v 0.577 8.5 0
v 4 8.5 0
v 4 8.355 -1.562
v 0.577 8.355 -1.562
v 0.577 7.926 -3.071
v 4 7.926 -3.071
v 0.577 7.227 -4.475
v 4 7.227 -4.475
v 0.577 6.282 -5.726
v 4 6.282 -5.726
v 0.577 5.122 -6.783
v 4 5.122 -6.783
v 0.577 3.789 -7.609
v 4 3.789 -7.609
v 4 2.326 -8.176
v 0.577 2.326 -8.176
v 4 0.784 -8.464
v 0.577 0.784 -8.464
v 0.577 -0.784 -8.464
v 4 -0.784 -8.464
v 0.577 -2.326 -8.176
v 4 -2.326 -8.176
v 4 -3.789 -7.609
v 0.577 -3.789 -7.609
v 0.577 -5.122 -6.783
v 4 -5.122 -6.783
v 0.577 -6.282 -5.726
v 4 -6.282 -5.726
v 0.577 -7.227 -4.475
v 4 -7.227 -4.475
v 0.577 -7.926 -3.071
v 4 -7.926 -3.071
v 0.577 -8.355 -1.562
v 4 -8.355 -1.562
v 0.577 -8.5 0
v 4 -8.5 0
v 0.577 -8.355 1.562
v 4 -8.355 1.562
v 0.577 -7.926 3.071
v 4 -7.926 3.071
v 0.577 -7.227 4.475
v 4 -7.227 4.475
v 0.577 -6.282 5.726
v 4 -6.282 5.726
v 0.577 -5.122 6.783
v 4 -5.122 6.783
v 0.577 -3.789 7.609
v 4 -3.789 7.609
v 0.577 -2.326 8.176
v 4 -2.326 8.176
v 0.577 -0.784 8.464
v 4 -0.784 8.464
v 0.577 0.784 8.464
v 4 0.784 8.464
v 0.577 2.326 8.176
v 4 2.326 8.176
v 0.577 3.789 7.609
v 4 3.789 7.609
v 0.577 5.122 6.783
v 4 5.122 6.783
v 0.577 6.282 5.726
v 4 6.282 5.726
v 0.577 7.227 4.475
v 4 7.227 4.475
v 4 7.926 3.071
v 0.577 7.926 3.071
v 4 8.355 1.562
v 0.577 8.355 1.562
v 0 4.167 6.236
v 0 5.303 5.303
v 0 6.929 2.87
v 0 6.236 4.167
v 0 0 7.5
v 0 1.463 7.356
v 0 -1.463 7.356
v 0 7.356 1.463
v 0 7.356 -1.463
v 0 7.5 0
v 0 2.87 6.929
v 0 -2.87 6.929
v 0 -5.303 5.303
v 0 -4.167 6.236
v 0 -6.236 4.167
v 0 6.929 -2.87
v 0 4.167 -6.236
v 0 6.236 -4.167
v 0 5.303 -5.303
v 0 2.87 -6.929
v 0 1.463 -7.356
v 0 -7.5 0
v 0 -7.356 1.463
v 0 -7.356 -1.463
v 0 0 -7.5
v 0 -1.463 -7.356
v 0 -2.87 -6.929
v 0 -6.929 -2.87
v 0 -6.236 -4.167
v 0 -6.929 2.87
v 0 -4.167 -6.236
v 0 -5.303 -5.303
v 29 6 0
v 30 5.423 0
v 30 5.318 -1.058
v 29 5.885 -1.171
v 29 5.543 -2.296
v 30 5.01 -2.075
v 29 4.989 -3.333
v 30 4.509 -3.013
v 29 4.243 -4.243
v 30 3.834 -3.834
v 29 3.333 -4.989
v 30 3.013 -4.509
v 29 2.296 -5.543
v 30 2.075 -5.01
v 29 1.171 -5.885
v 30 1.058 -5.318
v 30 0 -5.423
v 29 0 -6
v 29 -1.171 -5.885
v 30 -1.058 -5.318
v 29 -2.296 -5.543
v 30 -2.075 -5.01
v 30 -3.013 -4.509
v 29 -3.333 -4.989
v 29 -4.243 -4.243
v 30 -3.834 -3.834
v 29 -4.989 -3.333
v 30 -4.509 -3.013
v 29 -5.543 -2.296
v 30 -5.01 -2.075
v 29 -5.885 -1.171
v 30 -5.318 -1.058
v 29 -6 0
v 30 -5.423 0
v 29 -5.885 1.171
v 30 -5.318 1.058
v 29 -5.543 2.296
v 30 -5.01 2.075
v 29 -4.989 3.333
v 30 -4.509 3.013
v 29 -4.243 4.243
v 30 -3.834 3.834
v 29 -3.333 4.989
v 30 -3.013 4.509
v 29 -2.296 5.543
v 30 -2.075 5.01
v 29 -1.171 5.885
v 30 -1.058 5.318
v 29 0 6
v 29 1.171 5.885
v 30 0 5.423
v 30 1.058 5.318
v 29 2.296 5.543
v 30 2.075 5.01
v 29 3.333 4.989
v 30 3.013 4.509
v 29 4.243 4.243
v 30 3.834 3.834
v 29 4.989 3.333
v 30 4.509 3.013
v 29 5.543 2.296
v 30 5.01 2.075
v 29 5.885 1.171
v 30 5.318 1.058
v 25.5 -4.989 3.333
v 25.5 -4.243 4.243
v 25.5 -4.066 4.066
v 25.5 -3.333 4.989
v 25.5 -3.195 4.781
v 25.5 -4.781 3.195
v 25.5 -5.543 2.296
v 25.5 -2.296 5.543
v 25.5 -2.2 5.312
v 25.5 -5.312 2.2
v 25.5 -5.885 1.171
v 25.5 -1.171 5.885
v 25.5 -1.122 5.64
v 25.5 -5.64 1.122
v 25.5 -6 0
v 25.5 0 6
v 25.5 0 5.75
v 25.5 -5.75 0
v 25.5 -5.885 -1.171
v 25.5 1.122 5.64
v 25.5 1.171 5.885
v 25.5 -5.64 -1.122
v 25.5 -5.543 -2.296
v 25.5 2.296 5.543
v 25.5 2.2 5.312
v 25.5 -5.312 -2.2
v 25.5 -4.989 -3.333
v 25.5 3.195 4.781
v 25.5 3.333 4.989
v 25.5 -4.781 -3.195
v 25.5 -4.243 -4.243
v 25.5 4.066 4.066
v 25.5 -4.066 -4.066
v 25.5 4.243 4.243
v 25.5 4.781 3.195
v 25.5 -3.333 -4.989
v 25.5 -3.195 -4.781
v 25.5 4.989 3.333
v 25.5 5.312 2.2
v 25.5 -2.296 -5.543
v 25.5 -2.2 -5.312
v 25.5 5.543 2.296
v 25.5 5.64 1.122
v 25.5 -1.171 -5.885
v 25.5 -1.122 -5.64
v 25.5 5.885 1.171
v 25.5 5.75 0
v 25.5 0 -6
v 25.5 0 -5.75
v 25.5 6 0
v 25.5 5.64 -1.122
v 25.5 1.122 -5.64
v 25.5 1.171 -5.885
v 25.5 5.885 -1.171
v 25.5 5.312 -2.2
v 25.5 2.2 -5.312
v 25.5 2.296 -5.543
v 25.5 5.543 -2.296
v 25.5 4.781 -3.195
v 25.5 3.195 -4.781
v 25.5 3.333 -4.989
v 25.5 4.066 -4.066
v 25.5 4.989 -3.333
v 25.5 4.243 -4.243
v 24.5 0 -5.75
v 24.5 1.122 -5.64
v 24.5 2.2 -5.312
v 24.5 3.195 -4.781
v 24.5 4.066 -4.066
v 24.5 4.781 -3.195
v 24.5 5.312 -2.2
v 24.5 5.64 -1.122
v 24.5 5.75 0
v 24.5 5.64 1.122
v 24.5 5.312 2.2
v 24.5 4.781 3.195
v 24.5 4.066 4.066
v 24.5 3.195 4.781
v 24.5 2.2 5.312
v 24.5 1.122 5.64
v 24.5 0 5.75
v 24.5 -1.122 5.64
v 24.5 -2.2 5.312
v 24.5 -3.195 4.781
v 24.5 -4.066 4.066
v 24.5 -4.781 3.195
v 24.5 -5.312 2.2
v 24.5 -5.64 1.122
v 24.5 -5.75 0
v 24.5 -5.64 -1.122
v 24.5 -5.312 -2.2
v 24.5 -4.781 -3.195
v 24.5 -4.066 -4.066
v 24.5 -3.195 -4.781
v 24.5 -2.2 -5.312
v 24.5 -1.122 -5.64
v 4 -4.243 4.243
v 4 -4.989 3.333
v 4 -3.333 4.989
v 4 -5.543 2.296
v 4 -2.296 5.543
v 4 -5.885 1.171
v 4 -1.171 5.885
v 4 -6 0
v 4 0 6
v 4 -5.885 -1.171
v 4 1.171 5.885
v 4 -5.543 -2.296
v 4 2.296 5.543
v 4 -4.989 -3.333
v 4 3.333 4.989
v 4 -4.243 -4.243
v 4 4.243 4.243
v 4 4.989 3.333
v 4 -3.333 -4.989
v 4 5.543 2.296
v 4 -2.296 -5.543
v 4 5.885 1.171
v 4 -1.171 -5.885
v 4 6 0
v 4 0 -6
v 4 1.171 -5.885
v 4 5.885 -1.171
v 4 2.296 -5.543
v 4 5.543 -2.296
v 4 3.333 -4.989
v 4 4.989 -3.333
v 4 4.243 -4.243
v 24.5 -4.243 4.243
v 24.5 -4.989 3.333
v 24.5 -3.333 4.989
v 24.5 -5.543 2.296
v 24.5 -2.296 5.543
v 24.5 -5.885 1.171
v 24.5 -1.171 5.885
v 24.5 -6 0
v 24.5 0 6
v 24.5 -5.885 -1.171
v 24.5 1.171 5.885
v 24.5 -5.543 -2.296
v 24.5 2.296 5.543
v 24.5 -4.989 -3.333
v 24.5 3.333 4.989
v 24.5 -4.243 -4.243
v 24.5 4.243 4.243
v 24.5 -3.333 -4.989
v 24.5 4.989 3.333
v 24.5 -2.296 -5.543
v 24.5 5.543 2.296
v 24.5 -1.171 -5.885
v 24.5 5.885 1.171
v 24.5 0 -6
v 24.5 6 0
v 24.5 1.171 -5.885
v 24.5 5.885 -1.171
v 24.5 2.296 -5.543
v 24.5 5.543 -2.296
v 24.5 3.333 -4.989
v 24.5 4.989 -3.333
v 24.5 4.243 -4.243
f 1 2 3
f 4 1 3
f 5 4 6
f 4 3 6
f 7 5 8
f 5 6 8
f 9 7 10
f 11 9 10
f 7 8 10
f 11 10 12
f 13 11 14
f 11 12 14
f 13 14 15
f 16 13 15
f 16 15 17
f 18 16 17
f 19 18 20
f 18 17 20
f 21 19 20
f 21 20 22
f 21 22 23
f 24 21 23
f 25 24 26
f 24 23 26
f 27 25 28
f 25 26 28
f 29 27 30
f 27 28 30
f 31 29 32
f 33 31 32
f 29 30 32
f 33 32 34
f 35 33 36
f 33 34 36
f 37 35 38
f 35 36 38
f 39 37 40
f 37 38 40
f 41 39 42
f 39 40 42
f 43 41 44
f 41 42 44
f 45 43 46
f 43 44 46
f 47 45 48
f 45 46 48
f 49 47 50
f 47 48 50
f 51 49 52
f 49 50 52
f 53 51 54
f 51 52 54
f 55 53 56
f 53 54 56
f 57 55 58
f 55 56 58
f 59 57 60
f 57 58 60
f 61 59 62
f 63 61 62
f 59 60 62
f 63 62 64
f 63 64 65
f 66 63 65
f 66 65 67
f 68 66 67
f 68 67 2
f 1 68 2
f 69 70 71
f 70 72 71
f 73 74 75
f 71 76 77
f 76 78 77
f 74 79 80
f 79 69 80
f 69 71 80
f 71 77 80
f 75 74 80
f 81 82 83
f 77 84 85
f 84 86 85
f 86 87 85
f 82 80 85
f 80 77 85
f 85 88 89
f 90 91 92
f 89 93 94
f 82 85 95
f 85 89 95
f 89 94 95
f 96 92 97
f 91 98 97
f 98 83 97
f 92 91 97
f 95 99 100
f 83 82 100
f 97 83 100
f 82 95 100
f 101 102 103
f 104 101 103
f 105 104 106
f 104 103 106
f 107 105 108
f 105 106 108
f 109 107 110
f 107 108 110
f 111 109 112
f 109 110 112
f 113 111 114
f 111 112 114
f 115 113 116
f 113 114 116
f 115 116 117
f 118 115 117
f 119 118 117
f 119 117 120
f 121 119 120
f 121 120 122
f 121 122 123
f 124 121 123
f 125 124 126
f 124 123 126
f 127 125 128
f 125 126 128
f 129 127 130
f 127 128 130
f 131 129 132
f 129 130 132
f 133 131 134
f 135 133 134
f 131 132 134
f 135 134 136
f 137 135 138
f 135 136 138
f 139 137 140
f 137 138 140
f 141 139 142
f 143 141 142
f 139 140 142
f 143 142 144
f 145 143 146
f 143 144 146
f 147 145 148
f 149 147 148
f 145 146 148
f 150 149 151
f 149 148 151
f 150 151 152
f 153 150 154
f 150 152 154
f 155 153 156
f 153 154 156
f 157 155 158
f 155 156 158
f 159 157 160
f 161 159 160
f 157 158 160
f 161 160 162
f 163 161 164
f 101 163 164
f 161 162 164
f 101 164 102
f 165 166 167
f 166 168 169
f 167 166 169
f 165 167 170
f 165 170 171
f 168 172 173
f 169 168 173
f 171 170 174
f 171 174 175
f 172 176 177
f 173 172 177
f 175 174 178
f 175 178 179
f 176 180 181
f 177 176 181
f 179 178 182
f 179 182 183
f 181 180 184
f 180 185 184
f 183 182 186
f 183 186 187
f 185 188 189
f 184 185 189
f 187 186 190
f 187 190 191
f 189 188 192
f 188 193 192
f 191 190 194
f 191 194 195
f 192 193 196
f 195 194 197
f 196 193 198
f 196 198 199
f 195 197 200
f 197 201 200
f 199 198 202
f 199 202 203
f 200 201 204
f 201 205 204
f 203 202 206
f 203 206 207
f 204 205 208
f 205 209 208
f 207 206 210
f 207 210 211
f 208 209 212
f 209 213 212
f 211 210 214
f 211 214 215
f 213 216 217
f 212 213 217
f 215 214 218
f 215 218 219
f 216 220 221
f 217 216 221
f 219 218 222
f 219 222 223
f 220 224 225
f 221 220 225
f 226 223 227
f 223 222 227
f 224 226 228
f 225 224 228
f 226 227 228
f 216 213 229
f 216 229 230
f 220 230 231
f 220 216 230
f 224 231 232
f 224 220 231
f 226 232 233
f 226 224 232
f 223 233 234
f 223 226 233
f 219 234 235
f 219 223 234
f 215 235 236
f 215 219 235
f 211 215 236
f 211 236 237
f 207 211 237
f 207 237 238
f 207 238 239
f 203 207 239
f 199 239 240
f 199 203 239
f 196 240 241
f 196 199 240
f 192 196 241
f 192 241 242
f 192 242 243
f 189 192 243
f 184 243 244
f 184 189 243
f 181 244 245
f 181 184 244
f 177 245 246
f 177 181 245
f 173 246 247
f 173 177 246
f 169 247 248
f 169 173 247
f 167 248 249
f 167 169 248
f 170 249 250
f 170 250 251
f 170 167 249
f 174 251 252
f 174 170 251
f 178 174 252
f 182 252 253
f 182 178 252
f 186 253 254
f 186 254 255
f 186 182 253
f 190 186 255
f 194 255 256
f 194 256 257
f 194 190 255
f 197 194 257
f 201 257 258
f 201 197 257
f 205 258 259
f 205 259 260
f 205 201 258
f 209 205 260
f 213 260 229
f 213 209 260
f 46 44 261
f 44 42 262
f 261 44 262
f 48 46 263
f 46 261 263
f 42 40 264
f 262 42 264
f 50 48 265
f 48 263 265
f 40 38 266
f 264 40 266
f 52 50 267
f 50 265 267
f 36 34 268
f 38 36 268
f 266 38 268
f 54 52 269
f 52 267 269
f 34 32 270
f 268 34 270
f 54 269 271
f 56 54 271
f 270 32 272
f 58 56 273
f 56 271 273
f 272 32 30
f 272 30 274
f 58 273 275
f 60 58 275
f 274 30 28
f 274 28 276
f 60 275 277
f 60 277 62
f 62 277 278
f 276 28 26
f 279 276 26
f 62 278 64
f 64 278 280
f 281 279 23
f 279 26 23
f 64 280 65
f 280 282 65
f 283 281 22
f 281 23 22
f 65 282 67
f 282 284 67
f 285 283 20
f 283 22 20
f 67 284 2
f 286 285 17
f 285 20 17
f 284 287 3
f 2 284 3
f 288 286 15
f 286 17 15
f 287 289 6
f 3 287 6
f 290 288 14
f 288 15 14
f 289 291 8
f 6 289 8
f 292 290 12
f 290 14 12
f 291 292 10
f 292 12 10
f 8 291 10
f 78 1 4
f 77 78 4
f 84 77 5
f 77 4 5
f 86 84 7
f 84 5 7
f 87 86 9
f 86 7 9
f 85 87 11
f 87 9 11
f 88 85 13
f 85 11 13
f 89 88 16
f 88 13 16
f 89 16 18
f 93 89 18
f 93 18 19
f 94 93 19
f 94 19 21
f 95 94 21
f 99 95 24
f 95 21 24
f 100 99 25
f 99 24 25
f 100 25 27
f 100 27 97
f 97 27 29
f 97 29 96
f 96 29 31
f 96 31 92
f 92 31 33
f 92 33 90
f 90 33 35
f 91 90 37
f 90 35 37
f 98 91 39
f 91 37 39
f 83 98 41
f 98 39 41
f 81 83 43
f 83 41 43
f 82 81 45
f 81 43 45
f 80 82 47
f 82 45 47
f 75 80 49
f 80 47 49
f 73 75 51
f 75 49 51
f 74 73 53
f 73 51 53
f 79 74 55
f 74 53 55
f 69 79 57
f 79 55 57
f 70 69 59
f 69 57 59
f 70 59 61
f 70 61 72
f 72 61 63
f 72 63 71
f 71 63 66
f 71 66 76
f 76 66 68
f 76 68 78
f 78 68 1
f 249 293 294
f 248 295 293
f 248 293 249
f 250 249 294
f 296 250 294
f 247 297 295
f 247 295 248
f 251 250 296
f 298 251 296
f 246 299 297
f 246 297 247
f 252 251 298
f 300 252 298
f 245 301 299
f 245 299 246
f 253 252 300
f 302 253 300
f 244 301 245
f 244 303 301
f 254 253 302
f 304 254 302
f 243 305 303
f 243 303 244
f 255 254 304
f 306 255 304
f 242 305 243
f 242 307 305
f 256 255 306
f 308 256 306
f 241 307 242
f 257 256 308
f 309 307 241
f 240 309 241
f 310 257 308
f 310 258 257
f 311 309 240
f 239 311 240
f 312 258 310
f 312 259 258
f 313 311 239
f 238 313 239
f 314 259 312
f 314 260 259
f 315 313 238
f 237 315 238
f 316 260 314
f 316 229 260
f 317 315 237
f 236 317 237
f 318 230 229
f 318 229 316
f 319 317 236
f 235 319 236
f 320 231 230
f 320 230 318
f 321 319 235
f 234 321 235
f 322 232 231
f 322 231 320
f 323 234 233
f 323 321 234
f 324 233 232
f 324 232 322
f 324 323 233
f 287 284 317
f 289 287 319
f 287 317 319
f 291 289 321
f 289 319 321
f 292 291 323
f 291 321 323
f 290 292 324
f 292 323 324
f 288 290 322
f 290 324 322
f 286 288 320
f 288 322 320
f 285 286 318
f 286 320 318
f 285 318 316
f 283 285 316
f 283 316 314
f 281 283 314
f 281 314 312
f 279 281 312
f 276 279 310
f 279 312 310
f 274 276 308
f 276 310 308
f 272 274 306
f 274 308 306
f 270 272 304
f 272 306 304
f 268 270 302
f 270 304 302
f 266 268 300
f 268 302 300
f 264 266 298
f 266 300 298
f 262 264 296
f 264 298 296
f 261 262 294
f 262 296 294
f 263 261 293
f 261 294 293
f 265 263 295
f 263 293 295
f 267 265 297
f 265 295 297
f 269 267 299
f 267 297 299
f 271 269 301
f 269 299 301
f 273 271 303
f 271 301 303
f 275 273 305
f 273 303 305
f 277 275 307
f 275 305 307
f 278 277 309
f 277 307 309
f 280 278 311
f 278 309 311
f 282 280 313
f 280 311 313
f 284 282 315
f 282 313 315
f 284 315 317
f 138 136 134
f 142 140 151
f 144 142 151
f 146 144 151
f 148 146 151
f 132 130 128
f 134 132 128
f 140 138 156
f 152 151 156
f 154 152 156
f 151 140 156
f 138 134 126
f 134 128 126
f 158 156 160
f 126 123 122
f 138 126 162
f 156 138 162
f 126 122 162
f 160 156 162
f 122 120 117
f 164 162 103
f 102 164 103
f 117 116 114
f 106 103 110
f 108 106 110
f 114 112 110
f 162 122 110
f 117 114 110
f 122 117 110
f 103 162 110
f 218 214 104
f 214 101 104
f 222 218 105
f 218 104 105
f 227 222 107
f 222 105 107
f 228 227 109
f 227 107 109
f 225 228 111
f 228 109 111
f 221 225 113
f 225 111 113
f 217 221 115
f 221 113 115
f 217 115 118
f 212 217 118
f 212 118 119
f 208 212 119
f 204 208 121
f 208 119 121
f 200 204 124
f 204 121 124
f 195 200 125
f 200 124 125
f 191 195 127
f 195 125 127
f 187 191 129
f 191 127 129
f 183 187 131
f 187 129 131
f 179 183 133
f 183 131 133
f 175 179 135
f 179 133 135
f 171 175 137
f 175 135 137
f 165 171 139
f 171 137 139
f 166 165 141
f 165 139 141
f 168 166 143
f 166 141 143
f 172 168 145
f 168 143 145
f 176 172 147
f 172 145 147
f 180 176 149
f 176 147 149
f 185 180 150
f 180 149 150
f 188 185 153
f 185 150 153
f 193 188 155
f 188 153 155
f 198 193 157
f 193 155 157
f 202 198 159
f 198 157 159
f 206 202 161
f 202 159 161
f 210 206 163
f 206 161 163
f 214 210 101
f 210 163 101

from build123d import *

# Parameters (mm, degrees)
SFAZOWANIE1_SIZE           = 1
SFAZOWANIE1_SIZE2          = 0.577350269
SFAZOWANIE1_PART_2_SIZE    = 1
SFAZOWANIE1_PART_2_SIZE2   = 0.577350269
WYTNIJ_WYCI_GNI_CIE1_START = -4.5
SZKIC2_R                   = 6
SZKIC2_R_2                 = 5.75
WYTNIJ_WYCI_GNI_CIE1_DEPTH = 1


with BuildPart() as part:
    # Szkic1 → Obrót1 (revolve)
    with BuildSketch(Plane.XY):
        Polygon((0, 0), (0, 8.5), (4, 8.5), (4, 6), (30, 6), (30, 0), align=None)
    revolve(axis=Axis((30, 0, 0), (-1, 0, 0)))

    # Sfazowanie1
    sfazowanie1_edges = [part.edges().sort_by_distance(p)[0] for p in [
        (30, -6, 0),
    ]]
    sfazowanie1_side = [part.faces().sort_by_distance(p)[0] for p in [
        (17, -6, 0),
    ]]
    chamfer(sfazowanie1_edges, length=SFAZOWANIE1_SIZE, length2=SFAZOWANIE1_SIZE2, reference=sfazowanie1_side[0])

    # Sfazowanie1 part 2
    sfazowanie1_part_2_edges = [part.edges().sort_by_distance(p)[0] for p in [
        (0, -8.5, 0),
    ]]
    sfazowanie1_part_2_side = [part.faces().sort_by_distance(p)[0] for p in [
        (0, 0, 0),
    ]]
    chamfer(sfazowanie1_part_2_edges, length=SFAZOWANIE1_PART_2_SIZE, length2=SFAZOWANIE1_PART_2_SIZE2, reference=sfazowanie1_part_2_side[0])

    # Szkic2 → Wytnij-wyciągnięcie1 (cut)
    with BuildSketch(Plane(origin=(30, 0, 0), x_dir=(0, 0, -1), z_dir=(1, 0, 0)).offset(WYTNIJ_WYCI_GNI_CIE1_START)):
        Circle(SZKIC2_R)
        Circle(SZKIC2_R_2, mode=Mode.SUBTRACT)
    extrude(amount=-WYTNIJ_WYCI_GNI_CIE1_DEPTH, mode=Mode.SUBTRACT)


solid = part.part
